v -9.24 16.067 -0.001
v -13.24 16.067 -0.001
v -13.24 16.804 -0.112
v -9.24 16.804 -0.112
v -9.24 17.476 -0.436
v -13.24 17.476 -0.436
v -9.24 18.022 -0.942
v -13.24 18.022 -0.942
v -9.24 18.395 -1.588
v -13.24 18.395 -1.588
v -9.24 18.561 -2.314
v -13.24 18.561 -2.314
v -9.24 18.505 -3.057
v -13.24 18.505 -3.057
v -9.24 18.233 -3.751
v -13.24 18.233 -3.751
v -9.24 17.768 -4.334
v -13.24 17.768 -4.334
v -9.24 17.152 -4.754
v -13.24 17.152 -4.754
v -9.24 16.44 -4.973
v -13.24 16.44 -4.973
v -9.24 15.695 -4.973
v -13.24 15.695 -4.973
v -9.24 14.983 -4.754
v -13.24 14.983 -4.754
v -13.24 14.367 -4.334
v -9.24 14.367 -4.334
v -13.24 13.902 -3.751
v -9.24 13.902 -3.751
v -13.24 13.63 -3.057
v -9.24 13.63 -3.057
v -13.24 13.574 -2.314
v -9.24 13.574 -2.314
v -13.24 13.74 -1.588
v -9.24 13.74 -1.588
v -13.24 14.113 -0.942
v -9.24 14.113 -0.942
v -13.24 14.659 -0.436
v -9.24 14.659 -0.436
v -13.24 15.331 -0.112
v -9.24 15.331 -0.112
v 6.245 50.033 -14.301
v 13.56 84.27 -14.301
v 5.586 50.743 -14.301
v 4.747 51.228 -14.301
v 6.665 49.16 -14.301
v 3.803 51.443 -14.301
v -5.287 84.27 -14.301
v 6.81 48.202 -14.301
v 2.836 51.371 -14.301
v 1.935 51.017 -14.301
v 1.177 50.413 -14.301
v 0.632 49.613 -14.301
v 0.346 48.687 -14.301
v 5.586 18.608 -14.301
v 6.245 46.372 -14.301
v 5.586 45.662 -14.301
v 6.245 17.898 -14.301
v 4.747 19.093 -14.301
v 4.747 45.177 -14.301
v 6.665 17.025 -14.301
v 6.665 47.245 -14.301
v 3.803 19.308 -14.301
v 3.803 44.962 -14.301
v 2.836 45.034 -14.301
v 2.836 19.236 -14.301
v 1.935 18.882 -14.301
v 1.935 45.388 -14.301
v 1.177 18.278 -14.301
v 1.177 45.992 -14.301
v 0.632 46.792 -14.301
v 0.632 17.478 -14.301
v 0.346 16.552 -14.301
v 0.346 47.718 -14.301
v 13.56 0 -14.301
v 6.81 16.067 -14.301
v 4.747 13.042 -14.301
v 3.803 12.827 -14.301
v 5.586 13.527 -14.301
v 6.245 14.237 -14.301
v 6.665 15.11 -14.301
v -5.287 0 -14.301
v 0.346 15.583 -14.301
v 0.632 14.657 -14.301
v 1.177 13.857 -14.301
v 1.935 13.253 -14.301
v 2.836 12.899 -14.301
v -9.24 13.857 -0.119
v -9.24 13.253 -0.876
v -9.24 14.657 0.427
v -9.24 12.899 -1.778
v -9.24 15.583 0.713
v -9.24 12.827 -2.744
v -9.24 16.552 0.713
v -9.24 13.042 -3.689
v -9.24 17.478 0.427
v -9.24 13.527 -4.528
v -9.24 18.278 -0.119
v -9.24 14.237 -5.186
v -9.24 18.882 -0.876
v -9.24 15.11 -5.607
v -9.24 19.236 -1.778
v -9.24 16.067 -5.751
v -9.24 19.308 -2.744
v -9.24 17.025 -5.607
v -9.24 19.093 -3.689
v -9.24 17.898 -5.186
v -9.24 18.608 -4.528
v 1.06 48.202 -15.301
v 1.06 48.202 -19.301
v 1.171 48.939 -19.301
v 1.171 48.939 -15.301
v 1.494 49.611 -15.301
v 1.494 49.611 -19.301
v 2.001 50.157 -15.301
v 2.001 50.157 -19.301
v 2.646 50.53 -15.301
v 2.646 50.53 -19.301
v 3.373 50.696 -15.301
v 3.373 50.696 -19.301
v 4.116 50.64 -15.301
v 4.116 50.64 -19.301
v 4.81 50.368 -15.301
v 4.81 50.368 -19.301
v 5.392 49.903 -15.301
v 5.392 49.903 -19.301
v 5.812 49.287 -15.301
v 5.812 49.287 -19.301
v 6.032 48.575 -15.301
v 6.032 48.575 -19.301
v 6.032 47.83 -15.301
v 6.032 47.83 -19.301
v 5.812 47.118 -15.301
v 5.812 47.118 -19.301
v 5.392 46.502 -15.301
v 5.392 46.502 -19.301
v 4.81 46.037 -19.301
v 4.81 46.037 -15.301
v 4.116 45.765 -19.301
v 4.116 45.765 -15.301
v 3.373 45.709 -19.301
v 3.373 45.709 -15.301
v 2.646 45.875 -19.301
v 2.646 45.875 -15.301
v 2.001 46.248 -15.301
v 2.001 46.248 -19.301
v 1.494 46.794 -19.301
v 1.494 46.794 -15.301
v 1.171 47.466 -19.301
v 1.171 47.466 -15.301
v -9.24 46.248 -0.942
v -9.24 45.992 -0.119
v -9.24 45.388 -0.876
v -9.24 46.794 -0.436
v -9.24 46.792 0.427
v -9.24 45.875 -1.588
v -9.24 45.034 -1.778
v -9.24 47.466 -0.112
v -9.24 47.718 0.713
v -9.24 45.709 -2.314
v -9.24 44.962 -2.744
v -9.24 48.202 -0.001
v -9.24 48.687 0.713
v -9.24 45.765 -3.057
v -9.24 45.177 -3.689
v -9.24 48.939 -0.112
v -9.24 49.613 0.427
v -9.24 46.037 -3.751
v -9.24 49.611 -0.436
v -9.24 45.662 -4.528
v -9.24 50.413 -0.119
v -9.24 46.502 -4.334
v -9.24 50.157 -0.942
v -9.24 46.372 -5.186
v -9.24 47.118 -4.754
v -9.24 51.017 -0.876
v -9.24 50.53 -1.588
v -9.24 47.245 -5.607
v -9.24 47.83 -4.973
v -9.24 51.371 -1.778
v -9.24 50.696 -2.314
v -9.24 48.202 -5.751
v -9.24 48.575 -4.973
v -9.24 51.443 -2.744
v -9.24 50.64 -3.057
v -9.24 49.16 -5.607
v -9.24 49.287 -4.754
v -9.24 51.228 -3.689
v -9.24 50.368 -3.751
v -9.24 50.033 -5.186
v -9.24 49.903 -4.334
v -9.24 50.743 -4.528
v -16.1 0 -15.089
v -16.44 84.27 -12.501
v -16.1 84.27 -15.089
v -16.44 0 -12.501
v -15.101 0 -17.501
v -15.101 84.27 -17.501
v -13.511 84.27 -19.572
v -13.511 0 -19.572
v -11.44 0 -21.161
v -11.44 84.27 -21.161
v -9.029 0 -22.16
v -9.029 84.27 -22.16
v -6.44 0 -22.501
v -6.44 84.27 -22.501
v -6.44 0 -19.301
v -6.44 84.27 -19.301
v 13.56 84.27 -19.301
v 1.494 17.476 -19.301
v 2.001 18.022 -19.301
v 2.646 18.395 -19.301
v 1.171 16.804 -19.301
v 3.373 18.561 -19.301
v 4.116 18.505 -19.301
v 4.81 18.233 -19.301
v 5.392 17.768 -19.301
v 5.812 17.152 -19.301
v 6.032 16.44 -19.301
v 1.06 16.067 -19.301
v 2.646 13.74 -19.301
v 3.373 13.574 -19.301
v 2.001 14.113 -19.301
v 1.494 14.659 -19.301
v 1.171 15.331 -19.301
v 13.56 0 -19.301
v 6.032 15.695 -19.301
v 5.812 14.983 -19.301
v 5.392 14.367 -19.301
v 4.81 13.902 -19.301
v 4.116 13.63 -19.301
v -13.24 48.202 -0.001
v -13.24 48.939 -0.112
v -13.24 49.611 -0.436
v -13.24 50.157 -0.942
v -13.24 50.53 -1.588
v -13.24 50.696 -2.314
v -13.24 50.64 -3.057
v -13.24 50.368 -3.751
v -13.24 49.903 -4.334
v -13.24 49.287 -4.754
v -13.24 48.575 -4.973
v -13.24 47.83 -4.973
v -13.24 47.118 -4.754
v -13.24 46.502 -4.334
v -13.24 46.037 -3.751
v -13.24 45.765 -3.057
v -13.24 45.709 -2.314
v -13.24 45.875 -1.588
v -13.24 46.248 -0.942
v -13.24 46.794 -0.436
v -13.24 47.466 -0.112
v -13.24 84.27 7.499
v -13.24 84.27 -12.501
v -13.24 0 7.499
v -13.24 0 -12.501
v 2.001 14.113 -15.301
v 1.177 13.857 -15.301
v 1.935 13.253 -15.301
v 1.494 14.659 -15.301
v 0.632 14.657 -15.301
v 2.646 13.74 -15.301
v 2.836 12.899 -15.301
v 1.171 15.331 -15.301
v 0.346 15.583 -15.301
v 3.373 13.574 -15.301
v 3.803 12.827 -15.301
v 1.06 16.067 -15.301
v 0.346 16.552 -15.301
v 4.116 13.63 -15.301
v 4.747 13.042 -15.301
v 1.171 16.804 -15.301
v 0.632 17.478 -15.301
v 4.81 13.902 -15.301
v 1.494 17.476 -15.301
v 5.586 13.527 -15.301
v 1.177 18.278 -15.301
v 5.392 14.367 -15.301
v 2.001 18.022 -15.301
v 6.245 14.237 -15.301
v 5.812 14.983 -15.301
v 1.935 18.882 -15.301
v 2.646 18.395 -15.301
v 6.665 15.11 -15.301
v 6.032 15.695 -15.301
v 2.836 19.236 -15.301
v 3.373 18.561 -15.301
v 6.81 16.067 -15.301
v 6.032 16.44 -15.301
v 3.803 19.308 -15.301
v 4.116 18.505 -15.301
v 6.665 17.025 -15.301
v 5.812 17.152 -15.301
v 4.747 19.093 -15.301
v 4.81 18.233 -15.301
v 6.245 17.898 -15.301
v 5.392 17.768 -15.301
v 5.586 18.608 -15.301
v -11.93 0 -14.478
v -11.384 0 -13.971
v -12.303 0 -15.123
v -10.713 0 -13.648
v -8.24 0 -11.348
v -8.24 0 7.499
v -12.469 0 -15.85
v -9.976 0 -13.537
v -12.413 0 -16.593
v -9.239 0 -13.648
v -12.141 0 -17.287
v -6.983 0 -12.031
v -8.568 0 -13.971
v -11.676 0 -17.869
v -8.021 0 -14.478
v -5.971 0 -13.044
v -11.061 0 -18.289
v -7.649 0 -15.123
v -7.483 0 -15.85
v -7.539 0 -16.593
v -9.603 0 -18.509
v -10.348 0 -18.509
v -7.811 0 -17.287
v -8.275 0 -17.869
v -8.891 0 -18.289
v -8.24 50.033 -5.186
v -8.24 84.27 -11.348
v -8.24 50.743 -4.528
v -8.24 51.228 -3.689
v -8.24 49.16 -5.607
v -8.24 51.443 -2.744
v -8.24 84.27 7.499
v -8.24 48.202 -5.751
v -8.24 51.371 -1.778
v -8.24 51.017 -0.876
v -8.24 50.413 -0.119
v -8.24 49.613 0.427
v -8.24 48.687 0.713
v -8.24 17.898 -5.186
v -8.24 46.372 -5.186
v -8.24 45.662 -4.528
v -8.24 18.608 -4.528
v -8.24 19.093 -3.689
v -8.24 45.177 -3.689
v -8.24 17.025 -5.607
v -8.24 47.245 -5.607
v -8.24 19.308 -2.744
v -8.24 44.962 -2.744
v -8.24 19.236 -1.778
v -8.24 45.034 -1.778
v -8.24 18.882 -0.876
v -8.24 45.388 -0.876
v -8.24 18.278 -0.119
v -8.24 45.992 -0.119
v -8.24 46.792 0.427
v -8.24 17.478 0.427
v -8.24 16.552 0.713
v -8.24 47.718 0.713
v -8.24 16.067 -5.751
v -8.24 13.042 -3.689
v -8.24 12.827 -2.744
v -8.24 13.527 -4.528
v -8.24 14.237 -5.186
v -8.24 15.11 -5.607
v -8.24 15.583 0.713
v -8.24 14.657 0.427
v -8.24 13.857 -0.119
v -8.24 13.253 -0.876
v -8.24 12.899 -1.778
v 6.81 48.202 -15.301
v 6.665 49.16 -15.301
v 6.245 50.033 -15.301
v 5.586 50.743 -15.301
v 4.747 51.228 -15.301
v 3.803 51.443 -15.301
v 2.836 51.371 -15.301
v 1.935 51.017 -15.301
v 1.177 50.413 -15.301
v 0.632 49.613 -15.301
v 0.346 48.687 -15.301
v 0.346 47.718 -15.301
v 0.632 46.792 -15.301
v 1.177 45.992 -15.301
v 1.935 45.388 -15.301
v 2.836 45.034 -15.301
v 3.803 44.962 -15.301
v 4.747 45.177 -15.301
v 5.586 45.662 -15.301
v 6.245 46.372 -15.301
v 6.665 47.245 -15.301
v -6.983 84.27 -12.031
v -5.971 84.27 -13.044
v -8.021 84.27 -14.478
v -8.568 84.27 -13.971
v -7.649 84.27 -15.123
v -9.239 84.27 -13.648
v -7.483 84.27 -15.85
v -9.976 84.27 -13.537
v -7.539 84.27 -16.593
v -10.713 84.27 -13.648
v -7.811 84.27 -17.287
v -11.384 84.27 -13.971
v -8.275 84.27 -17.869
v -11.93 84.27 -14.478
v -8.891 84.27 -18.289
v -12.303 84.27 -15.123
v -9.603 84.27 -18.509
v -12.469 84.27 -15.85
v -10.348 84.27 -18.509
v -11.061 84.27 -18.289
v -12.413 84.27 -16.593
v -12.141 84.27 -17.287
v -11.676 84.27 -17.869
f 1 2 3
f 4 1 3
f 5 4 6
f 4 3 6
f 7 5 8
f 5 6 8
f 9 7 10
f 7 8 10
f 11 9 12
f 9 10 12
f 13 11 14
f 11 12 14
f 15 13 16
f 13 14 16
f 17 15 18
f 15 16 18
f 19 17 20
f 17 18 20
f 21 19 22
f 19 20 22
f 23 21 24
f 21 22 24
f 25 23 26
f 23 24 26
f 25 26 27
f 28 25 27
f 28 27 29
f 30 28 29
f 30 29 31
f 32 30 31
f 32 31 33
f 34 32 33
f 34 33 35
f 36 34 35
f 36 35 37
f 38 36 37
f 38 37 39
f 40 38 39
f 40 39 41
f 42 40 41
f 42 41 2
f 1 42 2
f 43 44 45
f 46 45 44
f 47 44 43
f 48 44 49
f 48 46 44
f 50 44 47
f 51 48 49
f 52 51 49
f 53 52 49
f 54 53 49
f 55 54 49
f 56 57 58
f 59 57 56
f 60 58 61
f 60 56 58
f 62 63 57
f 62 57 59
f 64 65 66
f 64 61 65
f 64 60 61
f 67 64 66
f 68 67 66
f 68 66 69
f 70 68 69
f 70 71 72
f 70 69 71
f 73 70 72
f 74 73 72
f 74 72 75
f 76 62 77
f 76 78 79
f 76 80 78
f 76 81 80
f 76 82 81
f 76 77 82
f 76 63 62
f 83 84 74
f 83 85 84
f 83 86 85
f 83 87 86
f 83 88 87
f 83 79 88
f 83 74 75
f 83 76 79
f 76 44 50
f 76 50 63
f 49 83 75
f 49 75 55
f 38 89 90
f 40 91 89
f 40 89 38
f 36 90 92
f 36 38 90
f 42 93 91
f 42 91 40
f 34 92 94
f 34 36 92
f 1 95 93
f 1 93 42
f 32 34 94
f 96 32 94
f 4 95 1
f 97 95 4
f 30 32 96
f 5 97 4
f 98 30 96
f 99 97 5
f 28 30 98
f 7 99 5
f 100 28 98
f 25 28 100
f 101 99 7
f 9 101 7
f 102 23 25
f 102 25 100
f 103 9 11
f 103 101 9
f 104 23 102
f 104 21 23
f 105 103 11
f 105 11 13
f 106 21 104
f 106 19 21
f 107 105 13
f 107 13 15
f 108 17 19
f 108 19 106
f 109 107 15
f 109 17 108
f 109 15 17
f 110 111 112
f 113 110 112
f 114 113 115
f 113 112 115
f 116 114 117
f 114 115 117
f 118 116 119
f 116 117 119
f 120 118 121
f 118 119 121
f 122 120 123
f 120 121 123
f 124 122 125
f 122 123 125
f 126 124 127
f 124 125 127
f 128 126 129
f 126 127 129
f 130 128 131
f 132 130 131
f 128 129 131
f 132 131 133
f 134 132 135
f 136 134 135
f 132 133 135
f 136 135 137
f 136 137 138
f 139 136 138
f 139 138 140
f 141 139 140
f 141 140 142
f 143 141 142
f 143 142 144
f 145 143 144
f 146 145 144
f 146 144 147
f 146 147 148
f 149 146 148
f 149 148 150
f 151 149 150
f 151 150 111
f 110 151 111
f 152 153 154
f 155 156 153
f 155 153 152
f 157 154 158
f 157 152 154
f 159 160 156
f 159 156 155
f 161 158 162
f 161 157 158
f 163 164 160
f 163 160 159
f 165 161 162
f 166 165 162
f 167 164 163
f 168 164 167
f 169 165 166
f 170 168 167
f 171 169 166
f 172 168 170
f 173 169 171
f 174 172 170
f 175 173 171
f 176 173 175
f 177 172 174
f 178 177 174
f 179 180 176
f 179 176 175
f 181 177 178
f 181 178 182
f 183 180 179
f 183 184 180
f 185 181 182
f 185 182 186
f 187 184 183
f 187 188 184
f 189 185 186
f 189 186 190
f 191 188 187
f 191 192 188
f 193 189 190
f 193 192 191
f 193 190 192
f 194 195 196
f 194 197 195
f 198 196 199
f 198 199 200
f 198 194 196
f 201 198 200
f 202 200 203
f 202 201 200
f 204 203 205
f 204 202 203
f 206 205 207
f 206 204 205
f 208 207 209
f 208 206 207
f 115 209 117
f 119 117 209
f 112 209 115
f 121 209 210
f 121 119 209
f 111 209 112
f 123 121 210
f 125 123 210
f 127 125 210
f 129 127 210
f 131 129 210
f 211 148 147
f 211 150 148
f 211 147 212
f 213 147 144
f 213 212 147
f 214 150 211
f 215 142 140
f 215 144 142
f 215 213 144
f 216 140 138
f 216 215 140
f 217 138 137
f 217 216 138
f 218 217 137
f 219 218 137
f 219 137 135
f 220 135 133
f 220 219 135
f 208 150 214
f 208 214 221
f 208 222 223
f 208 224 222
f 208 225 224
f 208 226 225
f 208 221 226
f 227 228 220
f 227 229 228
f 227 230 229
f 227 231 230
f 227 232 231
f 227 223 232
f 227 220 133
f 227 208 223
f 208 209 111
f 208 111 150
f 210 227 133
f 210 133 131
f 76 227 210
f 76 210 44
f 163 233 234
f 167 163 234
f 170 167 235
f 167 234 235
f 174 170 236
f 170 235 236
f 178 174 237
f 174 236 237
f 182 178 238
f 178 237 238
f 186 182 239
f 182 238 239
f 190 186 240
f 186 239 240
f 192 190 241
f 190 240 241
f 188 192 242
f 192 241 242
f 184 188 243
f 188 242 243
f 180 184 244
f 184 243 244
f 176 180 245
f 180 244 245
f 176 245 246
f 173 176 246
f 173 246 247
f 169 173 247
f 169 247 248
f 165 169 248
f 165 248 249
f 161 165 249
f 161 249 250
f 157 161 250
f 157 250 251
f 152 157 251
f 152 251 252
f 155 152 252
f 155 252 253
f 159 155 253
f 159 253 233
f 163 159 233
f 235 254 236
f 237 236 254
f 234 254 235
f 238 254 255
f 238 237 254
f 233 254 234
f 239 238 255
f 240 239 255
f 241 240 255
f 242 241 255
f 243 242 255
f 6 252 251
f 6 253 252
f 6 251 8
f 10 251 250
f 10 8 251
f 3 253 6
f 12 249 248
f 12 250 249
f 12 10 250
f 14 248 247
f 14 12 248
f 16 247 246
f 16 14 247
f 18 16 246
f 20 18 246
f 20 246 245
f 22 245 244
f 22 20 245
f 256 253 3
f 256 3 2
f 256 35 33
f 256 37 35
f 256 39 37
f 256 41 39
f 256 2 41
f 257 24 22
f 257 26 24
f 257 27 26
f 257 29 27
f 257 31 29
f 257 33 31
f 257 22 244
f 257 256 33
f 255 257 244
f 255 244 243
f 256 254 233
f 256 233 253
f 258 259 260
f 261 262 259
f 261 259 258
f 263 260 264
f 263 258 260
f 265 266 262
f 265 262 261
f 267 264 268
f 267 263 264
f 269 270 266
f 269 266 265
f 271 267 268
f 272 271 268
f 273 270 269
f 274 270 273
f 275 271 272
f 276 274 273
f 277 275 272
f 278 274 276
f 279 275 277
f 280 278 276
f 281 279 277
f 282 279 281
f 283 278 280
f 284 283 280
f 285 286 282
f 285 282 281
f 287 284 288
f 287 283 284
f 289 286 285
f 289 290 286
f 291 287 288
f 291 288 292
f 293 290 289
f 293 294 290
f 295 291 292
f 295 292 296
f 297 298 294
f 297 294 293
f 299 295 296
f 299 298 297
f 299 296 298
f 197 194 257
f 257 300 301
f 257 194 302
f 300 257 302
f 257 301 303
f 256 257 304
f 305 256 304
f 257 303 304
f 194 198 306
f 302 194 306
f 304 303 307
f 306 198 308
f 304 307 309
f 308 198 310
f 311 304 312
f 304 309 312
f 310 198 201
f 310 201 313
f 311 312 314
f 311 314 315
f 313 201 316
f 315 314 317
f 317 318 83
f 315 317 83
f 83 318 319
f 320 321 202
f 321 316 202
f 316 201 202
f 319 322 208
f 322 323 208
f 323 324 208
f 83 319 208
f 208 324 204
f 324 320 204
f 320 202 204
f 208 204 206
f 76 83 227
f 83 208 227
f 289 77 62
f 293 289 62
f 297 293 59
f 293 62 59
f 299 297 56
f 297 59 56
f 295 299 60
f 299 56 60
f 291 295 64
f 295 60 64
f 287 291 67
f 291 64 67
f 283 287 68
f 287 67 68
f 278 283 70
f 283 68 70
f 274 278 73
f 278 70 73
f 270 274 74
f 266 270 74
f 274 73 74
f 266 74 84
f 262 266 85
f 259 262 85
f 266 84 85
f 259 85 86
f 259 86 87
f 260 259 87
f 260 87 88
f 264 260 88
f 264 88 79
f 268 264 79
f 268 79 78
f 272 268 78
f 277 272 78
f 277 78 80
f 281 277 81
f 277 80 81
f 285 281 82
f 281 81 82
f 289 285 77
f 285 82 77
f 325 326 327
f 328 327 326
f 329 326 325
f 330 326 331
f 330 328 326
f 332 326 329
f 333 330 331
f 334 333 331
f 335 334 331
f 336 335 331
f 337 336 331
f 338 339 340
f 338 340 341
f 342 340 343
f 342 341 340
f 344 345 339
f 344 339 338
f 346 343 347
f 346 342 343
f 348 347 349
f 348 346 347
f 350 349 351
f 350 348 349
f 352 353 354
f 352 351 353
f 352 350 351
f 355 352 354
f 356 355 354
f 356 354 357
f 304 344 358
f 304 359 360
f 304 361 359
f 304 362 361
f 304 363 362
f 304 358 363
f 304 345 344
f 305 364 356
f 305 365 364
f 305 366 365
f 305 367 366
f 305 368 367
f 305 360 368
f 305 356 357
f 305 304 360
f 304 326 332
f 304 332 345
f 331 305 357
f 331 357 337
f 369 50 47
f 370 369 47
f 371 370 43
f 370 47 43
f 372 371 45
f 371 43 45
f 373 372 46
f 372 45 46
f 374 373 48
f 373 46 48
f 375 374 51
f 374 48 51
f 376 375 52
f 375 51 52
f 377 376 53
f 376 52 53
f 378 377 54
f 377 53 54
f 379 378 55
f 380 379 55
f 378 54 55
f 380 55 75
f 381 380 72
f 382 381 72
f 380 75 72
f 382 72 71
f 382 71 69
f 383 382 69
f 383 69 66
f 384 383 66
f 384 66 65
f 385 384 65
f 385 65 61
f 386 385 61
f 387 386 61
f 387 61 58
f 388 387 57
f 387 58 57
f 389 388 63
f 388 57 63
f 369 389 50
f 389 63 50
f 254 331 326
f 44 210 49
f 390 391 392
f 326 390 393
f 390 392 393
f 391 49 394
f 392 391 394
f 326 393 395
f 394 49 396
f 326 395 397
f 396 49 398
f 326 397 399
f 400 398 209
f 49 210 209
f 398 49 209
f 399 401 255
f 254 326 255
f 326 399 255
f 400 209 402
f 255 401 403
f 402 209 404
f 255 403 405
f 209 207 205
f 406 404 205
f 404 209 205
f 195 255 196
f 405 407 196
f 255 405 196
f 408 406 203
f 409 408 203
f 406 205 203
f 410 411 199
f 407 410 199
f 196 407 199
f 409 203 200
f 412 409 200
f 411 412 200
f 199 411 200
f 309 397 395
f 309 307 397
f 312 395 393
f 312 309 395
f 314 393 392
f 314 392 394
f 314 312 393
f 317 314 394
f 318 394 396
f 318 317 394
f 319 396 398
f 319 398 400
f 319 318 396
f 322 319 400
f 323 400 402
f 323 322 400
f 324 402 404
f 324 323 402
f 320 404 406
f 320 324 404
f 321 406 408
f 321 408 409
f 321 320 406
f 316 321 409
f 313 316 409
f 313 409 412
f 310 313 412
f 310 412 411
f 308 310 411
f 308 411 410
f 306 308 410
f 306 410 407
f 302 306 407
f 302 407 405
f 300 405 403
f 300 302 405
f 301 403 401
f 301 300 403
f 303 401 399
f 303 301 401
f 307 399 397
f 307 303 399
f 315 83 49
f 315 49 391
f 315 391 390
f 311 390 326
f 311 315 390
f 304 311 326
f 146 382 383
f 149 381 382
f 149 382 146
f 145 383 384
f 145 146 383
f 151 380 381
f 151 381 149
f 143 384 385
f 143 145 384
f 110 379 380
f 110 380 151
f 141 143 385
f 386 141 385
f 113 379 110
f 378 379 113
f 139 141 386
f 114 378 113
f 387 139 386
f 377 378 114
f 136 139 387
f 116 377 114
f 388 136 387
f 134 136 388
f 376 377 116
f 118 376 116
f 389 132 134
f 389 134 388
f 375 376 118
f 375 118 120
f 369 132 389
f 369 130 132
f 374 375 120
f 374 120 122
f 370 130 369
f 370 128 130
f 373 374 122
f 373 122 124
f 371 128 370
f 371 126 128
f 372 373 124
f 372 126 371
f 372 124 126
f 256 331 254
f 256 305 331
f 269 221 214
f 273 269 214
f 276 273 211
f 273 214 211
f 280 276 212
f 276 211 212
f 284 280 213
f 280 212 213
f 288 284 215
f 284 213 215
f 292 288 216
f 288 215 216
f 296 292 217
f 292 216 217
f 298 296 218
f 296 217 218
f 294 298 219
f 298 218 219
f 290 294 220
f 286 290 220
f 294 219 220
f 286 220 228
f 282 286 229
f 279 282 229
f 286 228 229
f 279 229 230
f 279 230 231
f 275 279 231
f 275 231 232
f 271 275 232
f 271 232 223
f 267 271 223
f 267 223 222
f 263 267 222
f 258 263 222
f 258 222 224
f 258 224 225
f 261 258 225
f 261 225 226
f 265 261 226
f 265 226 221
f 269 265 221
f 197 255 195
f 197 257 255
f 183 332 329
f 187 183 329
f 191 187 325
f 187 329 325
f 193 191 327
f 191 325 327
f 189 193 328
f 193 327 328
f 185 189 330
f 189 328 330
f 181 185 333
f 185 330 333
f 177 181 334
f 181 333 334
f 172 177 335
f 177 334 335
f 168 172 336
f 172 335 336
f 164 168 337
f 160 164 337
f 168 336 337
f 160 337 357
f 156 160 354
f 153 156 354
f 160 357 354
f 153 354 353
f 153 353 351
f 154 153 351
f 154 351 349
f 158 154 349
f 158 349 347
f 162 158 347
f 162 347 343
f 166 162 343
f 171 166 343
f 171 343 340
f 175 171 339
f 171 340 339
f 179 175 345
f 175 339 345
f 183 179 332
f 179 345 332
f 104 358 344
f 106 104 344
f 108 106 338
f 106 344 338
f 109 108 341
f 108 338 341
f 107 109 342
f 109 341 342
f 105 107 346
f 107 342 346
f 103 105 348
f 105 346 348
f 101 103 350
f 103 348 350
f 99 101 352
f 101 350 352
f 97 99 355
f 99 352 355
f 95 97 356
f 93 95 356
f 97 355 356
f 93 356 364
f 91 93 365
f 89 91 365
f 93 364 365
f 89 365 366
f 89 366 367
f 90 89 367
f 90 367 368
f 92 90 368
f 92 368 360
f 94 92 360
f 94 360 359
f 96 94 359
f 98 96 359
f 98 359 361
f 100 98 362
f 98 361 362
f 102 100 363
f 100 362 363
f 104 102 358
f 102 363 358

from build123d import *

# Parameters (mm, degrees)
SKETCH4_R           = 2.5
BOSS_EXTRUDE1_DEPTH = 64.27
SKETCH5_R           = 2.5
CUT_EXTRUDE1_DEPTH  = 72.548291037
SKETCH6_R           = 2.5
CUT_EXTRUDE2_DEPTH  = 74.179063133
SKETCH7_R           = 3.25
CUT_EXTRUDE3_DEPTH  = 1
SKETCH8_R           = 3.25
CUT_EXTRUDE4_DEPTH  = 1
SKETCH9_R           = 2.5
BOSS_EXTRUDE2_DEPTH = 20


with BuildPart() as part:
    # Sketch4 → Boss-Extrude1 (new body)
    with BuildSketch(Plane(origin=(0, 0, 0), x_dir=(1, 0, 0), z_dir=(0, 1, 0))):
        with BuildLine():
            Line((-5.286754077, 14.301163994), (13.559651759, 14.301163994))
            Line((13.559651759, 14.301163994), (13.559651759, 19.301163994))
            Line((13.559651759, 19.301163994), (-6.440348241, 19.301163994))
            Line((-6.440348241, 19.301163994), (-6.440348241, 22.501163994))
            ThreePointArc((-6.440348241, 22.501163994), (-13.511416053, 19.572231806), (-16.440348241, 12.501163994))
            Line((-16.440348241, 12.501163994), (-13.240348241, 12.501163994))
            Line((-13.240348241, 12.501163994), (-13.240348241, -7.498836006))
            Line((-13.240348241, -7.498836006), (-8.240348241, -7.498836006))
            Line((-8.240348241, -7.498836006), (-8.240348241, 11.347569829))
            ThreePointArc((-8.240348241, 11.347569829), (-6.440348241, 12.501163994), (-5.286754077, 14.301163994))
        make_face()
        with Locations(Location((-9.975882147, 16.0366979, 0), (0, 0, 270))):
            Circle(SKETCH4_R, mode=Mode.SUBTRACT)
    extrude(amount=BOSS_EXTRUDE1_DEPTH)

    # Sketch5 → Cut-Extrude1 (cut, through all)
    with BuildSketch(Plane(origin=(0, 0, -19.301163994), x_dir=(-1, 0, 0), z_dir=(0, 0, -1))):
        with Locations((-3.559651759, 48.2025)):
            Circle(SKETCH5_R)
        with Locations((-3.559651759, 16.0675)):
            Circle(SKETCH5_R)
    extrude(amount=-CUT_EXTRUDE1_DEPTH, mode=Mode.SUBTRACT)

    # Sketch6 → Cut-Extrude2 (cut, through all)
    with BuildSketch(Plane.ZY.offset(13.240348241)):
        with Locations((-2.501163994, 48.2025)):
            Circle(SKETCH6_R)
        with Locations((-2.501163994, 16.0675)):
            Circle(SKETCH6_R)
    extrude(amount=-CUT_EXTRUDE2_DEPTH, mode=Mode.SUBTRACT)

    # Sketch7 → Cut-Extrude3 (cut)
    with BuildSketch(Plane(origin=(-8.240348241, 0, 0), x_dir=(0, 0, -1), z_dir=(1, 0, 0))):
        with Locations((2.501163994, 48.2025)):
            Circle(SKETCH7_R)
        with Locations((2.501163994, 16.0675)):
            Circle(SKETCH7_R)
    extrude(amount=-CUT_EXTRUDE3_DEPTH, mode=Mode.SUBTRACT)

    # Sketch8 → Cut-Extrude4 (cut)
    with BuildSketch(Plane.XY.offset(-14.301163994)):
        with Locations((3.559651759, 48.2025)):
            Circle(SKETCH8_R)
        with Locations((3.559651759, 16.0675)):
            Circle(SKETCH8_R)
    extrude(amount=-CUT_EXTRUDE4_DEPTH, mode=Mode.SUBTRACT)

    # Sketch9 → Boss-Extrude2 (add)
    with BuildSketch(Plane(origin=(0, 64.27, 0), x_dir=(1, 0, 0), z_dir=(0, 1, 0))):
        with BuildLine():
            Line((-6.440348241, 22.501163994), (-6.440348241, 19.301163994))
            Line((-6.440348241, 19.301163994), (13.559651759, 19.301163994))
            Line((13.559651759, 19.301163994), (13.559651759, 14.301163994))
            Line((13.559651759, 14.301163994), (-5.286754077, 14.301163994))
            ThreePointArc((-5.286754077, 14.301163994), (-6.440348241, 12.501163994), (-8.240348241, 11.347569829))
            Line((-8.240348241, 11.347569829), (-8.240348241, -7.498836006))
            Line((-8.240348241, -7.498836006), (-13.240348241, -7.498836006))
            Line((-13.240348241, -7.498836006), (-13.240348241, 12.501163994))
            Line((-13.240348241, 12.501163994), (-16.440348241, 12.501163994))
            ThreePointArc((-16.440348241, 12.501163994), (-13.511416053, 19.572231806), (-6.440348241, 22.501163994))
        make_face()
        with Locations(Location((-9.975882147, 16.0366979, 0), (0, 0, 270))):
            Circle(SKETCH9_R, mode=Mode.SUBTRACT)
    extrude(amount=BOSS_EXTRUDE2_DEPTH)


solid = part.part
